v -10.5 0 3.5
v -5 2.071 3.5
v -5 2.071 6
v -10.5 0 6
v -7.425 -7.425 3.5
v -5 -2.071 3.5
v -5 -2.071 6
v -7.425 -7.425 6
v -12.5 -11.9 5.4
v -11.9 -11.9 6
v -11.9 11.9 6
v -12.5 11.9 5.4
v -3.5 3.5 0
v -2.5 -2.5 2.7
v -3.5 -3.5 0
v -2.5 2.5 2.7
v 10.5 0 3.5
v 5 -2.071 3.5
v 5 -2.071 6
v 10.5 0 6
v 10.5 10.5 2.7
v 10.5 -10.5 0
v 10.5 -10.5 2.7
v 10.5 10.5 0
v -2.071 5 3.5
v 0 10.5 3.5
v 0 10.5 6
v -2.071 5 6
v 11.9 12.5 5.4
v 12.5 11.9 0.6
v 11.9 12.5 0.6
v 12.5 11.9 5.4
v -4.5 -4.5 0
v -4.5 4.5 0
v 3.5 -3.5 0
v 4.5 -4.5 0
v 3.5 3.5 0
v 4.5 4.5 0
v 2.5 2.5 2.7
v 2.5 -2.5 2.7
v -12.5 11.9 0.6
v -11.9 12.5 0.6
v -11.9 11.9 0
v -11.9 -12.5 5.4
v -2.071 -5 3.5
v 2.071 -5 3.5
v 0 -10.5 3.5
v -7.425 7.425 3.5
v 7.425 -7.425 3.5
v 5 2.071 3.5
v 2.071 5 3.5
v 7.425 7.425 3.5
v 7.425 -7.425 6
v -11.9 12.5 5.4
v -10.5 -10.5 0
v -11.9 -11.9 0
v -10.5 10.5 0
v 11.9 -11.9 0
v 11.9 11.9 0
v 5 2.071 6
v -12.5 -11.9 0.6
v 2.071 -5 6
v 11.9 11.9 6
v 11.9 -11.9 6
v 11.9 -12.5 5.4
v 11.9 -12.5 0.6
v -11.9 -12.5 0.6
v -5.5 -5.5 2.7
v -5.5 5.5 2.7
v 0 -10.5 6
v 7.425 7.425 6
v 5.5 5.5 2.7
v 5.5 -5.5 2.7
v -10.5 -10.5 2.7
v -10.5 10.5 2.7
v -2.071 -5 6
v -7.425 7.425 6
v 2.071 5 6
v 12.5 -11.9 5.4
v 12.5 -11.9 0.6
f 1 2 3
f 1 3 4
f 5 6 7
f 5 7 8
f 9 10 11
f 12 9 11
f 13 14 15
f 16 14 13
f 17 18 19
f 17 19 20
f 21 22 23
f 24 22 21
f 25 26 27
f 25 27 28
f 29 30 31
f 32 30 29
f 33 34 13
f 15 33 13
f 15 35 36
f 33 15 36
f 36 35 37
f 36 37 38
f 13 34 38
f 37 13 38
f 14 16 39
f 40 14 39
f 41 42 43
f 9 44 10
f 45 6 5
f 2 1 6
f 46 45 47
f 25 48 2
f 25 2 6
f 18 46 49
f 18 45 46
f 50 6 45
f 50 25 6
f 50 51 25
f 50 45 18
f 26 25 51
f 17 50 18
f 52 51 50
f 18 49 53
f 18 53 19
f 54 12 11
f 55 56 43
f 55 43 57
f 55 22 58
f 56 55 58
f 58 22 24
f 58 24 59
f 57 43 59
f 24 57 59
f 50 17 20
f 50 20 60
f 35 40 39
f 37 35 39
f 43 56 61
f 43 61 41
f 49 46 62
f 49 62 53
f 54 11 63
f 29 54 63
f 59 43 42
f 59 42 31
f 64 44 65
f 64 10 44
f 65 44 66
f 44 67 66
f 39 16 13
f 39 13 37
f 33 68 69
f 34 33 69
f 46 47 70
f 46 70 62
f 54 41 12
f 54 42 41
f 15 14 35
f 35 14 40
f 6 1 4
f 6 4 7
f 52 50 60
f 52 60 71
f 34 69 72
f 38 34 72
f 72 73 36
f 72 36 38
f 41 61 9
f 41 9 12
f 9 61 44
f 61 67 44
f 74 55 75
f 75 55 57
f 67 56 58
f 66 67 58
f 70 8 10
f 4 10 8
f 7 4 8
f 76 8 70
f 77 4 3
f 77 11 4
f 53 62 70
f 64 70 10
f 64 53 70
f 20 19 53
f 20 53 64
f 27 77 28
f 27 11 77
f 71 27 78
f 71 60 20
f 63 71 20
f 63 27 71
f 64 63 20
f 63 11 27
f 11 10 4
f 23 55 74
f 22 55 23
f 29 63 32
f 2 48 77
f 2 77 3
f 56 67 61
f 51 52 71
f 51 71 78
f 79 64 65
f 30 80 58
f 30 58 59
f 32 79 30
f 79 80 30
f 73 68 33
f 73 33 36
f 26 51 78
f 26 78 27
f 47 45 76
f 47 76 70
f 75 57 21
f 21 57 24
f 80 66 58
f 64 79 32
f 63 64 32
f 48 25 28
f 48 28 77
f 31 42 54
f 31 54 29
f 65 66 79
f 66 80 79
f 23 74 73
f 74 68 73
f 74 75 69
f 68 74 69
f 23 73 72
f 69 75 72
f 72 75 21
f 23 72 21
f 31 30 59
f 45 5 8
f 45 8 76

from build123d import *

# Parameters (mm, degrees)
F0_W     = 25
F0_H     = 25
F1_DEPTH = 6
F2_W     = 21
F2_H     = 21
F2_W_2   = 11
F2_H_2   = 11
F2_W_3   = 5
F2_H_3   = 5
F3_DEPTH = 2.7
F4_START = 3.5
F4_DEPTH = 2.501
F5_SIZE  = 0.6
F6_SIZE2 = 2.69999
F6_SIZE  = 0.99999


# Not quite as in the source:
# - a fillet or chamfer is up to 0.001 mm smaller than in the source, because OpenCascade refuses the exact size


with BuildPart() as f1:
    # F0 (on Top) → F1 (new body)
    with BuildSketch(Plane.XY):
        Rectangle(F0_W, F0_H)
        Polygon((-7.4246212025, 7.4246212025), (-2.0710678119, 5), (0, 10.5), (2.0710678119, 5), (7.4246212025, 7.4246212025), (5, 2.0710678119), (10.5, 0), (5, -2.0710678119), (7.4246212025, -7.4246212025), (2.0710678119, -5), (0, -10.5), (-2.0710678119, -5), (-7.4246212025, -7.4246212025), (-5, -2.0710678119), (-10.5, 0), (-5, 2.0710678119), align=None, mode=Mode.SUBTRACT)
        Polygon((0, 10.5), (-2.0710678119, 5), (-7.4246212025, 7.4246212025), (-5, 2.0710678119), (-10.5, 0), (-5, -2.0710678119), (-7.4246212025, -7.4246212025), (-2.0710678119, -5), (0, -10.5), (2.0710678119, -5), (7.4246212025, -7.4246212025), (5, -2.0710678119), (10.5, 0), (5, 2.0710678119), (7.4246212025, 7.4246212025), (2.0710678119, 5), align=None)
    extrude(amount=F1_DEPTH)

    # F2 (on Top) → F3 (cut)
    with BuildSketch(Plane.XY):
        Rectangle(F2_W, F2_H)
        Rectangle(F2_W_2, F2_H_2, mode=Mode.SUBTRACT)
        Rectangle(F2_W_3, F2_H_3)
    extrude(amount=F3_DEPTH, mode=Mode.SUBTRACT)

    # F0 (on Top) → F4 (cut)
    with BuildSketch(Plane.XY.offset(F4_START)):
        Polygon((0, 10.5), (-2.0710678119, 5), (-7.4246212025, 7.4246212025), (-5, 2.0710678119), (-10.5, 0), (-5, -2.0710678119), (-7.4246212025, -7.4246212025), (-2.0710678119, -5), (0, -10.5), (2.0710678119, -5), (7.4246212025, -7.4246212025), (5, -2.0710678119), (10.5, 0), (5, 2.0710678119), (7.4246212025, 7.4246212025), (2.0710678119, 5), align=None)
    extrude(amount=F4_DEPTH, mode=Mode.SUBTRACT)

    # F5
    f5_edges = [f1.edges().sort_by_distance(p)[0] for p in [
        (0, -12.5, 6),
        (-12.5, -12.5, 3),
        (-12.5, 0, 6),
        (-12.5, 12.5, 3),
        (0, 12.5, 6),
        (12.5, 0, 6),
        (12.5, -12.5, 3),
        (12.5, 12.5, 3),
        (0, -12.5, 0),
        (12.5, 0, 0),
        (0, 12.5, 0),
        (-12.5, 0, 0),
    ]]
    chamfer(f5_edges, length=F5_SIZE)

    # F6 (size 1 and 2.7 in the source; OpenCascade refuses exactly that, so slightly less here)
    f6_edges = [f1.edges().sort_by_distance(p)[0] for p in [
        (-5.5, 0, 0),
        (0, 5.5, 0),
        (5.5, 0, 0),
        (0, -5.5, 0),
        (-2.5, 0, 0),
        (0, -2.5, 0),
        (2.5, 0, 0),
        (0, 2.5, 0),
    ]]
    f6_side = f1.faces().sort_by_distance((-5.344437, 0, 0))[0]
    chamfer(f6_edges, length=F6_SIZE, length2=F6_SIZE2, reference=f6_side)


solid = f1.part
